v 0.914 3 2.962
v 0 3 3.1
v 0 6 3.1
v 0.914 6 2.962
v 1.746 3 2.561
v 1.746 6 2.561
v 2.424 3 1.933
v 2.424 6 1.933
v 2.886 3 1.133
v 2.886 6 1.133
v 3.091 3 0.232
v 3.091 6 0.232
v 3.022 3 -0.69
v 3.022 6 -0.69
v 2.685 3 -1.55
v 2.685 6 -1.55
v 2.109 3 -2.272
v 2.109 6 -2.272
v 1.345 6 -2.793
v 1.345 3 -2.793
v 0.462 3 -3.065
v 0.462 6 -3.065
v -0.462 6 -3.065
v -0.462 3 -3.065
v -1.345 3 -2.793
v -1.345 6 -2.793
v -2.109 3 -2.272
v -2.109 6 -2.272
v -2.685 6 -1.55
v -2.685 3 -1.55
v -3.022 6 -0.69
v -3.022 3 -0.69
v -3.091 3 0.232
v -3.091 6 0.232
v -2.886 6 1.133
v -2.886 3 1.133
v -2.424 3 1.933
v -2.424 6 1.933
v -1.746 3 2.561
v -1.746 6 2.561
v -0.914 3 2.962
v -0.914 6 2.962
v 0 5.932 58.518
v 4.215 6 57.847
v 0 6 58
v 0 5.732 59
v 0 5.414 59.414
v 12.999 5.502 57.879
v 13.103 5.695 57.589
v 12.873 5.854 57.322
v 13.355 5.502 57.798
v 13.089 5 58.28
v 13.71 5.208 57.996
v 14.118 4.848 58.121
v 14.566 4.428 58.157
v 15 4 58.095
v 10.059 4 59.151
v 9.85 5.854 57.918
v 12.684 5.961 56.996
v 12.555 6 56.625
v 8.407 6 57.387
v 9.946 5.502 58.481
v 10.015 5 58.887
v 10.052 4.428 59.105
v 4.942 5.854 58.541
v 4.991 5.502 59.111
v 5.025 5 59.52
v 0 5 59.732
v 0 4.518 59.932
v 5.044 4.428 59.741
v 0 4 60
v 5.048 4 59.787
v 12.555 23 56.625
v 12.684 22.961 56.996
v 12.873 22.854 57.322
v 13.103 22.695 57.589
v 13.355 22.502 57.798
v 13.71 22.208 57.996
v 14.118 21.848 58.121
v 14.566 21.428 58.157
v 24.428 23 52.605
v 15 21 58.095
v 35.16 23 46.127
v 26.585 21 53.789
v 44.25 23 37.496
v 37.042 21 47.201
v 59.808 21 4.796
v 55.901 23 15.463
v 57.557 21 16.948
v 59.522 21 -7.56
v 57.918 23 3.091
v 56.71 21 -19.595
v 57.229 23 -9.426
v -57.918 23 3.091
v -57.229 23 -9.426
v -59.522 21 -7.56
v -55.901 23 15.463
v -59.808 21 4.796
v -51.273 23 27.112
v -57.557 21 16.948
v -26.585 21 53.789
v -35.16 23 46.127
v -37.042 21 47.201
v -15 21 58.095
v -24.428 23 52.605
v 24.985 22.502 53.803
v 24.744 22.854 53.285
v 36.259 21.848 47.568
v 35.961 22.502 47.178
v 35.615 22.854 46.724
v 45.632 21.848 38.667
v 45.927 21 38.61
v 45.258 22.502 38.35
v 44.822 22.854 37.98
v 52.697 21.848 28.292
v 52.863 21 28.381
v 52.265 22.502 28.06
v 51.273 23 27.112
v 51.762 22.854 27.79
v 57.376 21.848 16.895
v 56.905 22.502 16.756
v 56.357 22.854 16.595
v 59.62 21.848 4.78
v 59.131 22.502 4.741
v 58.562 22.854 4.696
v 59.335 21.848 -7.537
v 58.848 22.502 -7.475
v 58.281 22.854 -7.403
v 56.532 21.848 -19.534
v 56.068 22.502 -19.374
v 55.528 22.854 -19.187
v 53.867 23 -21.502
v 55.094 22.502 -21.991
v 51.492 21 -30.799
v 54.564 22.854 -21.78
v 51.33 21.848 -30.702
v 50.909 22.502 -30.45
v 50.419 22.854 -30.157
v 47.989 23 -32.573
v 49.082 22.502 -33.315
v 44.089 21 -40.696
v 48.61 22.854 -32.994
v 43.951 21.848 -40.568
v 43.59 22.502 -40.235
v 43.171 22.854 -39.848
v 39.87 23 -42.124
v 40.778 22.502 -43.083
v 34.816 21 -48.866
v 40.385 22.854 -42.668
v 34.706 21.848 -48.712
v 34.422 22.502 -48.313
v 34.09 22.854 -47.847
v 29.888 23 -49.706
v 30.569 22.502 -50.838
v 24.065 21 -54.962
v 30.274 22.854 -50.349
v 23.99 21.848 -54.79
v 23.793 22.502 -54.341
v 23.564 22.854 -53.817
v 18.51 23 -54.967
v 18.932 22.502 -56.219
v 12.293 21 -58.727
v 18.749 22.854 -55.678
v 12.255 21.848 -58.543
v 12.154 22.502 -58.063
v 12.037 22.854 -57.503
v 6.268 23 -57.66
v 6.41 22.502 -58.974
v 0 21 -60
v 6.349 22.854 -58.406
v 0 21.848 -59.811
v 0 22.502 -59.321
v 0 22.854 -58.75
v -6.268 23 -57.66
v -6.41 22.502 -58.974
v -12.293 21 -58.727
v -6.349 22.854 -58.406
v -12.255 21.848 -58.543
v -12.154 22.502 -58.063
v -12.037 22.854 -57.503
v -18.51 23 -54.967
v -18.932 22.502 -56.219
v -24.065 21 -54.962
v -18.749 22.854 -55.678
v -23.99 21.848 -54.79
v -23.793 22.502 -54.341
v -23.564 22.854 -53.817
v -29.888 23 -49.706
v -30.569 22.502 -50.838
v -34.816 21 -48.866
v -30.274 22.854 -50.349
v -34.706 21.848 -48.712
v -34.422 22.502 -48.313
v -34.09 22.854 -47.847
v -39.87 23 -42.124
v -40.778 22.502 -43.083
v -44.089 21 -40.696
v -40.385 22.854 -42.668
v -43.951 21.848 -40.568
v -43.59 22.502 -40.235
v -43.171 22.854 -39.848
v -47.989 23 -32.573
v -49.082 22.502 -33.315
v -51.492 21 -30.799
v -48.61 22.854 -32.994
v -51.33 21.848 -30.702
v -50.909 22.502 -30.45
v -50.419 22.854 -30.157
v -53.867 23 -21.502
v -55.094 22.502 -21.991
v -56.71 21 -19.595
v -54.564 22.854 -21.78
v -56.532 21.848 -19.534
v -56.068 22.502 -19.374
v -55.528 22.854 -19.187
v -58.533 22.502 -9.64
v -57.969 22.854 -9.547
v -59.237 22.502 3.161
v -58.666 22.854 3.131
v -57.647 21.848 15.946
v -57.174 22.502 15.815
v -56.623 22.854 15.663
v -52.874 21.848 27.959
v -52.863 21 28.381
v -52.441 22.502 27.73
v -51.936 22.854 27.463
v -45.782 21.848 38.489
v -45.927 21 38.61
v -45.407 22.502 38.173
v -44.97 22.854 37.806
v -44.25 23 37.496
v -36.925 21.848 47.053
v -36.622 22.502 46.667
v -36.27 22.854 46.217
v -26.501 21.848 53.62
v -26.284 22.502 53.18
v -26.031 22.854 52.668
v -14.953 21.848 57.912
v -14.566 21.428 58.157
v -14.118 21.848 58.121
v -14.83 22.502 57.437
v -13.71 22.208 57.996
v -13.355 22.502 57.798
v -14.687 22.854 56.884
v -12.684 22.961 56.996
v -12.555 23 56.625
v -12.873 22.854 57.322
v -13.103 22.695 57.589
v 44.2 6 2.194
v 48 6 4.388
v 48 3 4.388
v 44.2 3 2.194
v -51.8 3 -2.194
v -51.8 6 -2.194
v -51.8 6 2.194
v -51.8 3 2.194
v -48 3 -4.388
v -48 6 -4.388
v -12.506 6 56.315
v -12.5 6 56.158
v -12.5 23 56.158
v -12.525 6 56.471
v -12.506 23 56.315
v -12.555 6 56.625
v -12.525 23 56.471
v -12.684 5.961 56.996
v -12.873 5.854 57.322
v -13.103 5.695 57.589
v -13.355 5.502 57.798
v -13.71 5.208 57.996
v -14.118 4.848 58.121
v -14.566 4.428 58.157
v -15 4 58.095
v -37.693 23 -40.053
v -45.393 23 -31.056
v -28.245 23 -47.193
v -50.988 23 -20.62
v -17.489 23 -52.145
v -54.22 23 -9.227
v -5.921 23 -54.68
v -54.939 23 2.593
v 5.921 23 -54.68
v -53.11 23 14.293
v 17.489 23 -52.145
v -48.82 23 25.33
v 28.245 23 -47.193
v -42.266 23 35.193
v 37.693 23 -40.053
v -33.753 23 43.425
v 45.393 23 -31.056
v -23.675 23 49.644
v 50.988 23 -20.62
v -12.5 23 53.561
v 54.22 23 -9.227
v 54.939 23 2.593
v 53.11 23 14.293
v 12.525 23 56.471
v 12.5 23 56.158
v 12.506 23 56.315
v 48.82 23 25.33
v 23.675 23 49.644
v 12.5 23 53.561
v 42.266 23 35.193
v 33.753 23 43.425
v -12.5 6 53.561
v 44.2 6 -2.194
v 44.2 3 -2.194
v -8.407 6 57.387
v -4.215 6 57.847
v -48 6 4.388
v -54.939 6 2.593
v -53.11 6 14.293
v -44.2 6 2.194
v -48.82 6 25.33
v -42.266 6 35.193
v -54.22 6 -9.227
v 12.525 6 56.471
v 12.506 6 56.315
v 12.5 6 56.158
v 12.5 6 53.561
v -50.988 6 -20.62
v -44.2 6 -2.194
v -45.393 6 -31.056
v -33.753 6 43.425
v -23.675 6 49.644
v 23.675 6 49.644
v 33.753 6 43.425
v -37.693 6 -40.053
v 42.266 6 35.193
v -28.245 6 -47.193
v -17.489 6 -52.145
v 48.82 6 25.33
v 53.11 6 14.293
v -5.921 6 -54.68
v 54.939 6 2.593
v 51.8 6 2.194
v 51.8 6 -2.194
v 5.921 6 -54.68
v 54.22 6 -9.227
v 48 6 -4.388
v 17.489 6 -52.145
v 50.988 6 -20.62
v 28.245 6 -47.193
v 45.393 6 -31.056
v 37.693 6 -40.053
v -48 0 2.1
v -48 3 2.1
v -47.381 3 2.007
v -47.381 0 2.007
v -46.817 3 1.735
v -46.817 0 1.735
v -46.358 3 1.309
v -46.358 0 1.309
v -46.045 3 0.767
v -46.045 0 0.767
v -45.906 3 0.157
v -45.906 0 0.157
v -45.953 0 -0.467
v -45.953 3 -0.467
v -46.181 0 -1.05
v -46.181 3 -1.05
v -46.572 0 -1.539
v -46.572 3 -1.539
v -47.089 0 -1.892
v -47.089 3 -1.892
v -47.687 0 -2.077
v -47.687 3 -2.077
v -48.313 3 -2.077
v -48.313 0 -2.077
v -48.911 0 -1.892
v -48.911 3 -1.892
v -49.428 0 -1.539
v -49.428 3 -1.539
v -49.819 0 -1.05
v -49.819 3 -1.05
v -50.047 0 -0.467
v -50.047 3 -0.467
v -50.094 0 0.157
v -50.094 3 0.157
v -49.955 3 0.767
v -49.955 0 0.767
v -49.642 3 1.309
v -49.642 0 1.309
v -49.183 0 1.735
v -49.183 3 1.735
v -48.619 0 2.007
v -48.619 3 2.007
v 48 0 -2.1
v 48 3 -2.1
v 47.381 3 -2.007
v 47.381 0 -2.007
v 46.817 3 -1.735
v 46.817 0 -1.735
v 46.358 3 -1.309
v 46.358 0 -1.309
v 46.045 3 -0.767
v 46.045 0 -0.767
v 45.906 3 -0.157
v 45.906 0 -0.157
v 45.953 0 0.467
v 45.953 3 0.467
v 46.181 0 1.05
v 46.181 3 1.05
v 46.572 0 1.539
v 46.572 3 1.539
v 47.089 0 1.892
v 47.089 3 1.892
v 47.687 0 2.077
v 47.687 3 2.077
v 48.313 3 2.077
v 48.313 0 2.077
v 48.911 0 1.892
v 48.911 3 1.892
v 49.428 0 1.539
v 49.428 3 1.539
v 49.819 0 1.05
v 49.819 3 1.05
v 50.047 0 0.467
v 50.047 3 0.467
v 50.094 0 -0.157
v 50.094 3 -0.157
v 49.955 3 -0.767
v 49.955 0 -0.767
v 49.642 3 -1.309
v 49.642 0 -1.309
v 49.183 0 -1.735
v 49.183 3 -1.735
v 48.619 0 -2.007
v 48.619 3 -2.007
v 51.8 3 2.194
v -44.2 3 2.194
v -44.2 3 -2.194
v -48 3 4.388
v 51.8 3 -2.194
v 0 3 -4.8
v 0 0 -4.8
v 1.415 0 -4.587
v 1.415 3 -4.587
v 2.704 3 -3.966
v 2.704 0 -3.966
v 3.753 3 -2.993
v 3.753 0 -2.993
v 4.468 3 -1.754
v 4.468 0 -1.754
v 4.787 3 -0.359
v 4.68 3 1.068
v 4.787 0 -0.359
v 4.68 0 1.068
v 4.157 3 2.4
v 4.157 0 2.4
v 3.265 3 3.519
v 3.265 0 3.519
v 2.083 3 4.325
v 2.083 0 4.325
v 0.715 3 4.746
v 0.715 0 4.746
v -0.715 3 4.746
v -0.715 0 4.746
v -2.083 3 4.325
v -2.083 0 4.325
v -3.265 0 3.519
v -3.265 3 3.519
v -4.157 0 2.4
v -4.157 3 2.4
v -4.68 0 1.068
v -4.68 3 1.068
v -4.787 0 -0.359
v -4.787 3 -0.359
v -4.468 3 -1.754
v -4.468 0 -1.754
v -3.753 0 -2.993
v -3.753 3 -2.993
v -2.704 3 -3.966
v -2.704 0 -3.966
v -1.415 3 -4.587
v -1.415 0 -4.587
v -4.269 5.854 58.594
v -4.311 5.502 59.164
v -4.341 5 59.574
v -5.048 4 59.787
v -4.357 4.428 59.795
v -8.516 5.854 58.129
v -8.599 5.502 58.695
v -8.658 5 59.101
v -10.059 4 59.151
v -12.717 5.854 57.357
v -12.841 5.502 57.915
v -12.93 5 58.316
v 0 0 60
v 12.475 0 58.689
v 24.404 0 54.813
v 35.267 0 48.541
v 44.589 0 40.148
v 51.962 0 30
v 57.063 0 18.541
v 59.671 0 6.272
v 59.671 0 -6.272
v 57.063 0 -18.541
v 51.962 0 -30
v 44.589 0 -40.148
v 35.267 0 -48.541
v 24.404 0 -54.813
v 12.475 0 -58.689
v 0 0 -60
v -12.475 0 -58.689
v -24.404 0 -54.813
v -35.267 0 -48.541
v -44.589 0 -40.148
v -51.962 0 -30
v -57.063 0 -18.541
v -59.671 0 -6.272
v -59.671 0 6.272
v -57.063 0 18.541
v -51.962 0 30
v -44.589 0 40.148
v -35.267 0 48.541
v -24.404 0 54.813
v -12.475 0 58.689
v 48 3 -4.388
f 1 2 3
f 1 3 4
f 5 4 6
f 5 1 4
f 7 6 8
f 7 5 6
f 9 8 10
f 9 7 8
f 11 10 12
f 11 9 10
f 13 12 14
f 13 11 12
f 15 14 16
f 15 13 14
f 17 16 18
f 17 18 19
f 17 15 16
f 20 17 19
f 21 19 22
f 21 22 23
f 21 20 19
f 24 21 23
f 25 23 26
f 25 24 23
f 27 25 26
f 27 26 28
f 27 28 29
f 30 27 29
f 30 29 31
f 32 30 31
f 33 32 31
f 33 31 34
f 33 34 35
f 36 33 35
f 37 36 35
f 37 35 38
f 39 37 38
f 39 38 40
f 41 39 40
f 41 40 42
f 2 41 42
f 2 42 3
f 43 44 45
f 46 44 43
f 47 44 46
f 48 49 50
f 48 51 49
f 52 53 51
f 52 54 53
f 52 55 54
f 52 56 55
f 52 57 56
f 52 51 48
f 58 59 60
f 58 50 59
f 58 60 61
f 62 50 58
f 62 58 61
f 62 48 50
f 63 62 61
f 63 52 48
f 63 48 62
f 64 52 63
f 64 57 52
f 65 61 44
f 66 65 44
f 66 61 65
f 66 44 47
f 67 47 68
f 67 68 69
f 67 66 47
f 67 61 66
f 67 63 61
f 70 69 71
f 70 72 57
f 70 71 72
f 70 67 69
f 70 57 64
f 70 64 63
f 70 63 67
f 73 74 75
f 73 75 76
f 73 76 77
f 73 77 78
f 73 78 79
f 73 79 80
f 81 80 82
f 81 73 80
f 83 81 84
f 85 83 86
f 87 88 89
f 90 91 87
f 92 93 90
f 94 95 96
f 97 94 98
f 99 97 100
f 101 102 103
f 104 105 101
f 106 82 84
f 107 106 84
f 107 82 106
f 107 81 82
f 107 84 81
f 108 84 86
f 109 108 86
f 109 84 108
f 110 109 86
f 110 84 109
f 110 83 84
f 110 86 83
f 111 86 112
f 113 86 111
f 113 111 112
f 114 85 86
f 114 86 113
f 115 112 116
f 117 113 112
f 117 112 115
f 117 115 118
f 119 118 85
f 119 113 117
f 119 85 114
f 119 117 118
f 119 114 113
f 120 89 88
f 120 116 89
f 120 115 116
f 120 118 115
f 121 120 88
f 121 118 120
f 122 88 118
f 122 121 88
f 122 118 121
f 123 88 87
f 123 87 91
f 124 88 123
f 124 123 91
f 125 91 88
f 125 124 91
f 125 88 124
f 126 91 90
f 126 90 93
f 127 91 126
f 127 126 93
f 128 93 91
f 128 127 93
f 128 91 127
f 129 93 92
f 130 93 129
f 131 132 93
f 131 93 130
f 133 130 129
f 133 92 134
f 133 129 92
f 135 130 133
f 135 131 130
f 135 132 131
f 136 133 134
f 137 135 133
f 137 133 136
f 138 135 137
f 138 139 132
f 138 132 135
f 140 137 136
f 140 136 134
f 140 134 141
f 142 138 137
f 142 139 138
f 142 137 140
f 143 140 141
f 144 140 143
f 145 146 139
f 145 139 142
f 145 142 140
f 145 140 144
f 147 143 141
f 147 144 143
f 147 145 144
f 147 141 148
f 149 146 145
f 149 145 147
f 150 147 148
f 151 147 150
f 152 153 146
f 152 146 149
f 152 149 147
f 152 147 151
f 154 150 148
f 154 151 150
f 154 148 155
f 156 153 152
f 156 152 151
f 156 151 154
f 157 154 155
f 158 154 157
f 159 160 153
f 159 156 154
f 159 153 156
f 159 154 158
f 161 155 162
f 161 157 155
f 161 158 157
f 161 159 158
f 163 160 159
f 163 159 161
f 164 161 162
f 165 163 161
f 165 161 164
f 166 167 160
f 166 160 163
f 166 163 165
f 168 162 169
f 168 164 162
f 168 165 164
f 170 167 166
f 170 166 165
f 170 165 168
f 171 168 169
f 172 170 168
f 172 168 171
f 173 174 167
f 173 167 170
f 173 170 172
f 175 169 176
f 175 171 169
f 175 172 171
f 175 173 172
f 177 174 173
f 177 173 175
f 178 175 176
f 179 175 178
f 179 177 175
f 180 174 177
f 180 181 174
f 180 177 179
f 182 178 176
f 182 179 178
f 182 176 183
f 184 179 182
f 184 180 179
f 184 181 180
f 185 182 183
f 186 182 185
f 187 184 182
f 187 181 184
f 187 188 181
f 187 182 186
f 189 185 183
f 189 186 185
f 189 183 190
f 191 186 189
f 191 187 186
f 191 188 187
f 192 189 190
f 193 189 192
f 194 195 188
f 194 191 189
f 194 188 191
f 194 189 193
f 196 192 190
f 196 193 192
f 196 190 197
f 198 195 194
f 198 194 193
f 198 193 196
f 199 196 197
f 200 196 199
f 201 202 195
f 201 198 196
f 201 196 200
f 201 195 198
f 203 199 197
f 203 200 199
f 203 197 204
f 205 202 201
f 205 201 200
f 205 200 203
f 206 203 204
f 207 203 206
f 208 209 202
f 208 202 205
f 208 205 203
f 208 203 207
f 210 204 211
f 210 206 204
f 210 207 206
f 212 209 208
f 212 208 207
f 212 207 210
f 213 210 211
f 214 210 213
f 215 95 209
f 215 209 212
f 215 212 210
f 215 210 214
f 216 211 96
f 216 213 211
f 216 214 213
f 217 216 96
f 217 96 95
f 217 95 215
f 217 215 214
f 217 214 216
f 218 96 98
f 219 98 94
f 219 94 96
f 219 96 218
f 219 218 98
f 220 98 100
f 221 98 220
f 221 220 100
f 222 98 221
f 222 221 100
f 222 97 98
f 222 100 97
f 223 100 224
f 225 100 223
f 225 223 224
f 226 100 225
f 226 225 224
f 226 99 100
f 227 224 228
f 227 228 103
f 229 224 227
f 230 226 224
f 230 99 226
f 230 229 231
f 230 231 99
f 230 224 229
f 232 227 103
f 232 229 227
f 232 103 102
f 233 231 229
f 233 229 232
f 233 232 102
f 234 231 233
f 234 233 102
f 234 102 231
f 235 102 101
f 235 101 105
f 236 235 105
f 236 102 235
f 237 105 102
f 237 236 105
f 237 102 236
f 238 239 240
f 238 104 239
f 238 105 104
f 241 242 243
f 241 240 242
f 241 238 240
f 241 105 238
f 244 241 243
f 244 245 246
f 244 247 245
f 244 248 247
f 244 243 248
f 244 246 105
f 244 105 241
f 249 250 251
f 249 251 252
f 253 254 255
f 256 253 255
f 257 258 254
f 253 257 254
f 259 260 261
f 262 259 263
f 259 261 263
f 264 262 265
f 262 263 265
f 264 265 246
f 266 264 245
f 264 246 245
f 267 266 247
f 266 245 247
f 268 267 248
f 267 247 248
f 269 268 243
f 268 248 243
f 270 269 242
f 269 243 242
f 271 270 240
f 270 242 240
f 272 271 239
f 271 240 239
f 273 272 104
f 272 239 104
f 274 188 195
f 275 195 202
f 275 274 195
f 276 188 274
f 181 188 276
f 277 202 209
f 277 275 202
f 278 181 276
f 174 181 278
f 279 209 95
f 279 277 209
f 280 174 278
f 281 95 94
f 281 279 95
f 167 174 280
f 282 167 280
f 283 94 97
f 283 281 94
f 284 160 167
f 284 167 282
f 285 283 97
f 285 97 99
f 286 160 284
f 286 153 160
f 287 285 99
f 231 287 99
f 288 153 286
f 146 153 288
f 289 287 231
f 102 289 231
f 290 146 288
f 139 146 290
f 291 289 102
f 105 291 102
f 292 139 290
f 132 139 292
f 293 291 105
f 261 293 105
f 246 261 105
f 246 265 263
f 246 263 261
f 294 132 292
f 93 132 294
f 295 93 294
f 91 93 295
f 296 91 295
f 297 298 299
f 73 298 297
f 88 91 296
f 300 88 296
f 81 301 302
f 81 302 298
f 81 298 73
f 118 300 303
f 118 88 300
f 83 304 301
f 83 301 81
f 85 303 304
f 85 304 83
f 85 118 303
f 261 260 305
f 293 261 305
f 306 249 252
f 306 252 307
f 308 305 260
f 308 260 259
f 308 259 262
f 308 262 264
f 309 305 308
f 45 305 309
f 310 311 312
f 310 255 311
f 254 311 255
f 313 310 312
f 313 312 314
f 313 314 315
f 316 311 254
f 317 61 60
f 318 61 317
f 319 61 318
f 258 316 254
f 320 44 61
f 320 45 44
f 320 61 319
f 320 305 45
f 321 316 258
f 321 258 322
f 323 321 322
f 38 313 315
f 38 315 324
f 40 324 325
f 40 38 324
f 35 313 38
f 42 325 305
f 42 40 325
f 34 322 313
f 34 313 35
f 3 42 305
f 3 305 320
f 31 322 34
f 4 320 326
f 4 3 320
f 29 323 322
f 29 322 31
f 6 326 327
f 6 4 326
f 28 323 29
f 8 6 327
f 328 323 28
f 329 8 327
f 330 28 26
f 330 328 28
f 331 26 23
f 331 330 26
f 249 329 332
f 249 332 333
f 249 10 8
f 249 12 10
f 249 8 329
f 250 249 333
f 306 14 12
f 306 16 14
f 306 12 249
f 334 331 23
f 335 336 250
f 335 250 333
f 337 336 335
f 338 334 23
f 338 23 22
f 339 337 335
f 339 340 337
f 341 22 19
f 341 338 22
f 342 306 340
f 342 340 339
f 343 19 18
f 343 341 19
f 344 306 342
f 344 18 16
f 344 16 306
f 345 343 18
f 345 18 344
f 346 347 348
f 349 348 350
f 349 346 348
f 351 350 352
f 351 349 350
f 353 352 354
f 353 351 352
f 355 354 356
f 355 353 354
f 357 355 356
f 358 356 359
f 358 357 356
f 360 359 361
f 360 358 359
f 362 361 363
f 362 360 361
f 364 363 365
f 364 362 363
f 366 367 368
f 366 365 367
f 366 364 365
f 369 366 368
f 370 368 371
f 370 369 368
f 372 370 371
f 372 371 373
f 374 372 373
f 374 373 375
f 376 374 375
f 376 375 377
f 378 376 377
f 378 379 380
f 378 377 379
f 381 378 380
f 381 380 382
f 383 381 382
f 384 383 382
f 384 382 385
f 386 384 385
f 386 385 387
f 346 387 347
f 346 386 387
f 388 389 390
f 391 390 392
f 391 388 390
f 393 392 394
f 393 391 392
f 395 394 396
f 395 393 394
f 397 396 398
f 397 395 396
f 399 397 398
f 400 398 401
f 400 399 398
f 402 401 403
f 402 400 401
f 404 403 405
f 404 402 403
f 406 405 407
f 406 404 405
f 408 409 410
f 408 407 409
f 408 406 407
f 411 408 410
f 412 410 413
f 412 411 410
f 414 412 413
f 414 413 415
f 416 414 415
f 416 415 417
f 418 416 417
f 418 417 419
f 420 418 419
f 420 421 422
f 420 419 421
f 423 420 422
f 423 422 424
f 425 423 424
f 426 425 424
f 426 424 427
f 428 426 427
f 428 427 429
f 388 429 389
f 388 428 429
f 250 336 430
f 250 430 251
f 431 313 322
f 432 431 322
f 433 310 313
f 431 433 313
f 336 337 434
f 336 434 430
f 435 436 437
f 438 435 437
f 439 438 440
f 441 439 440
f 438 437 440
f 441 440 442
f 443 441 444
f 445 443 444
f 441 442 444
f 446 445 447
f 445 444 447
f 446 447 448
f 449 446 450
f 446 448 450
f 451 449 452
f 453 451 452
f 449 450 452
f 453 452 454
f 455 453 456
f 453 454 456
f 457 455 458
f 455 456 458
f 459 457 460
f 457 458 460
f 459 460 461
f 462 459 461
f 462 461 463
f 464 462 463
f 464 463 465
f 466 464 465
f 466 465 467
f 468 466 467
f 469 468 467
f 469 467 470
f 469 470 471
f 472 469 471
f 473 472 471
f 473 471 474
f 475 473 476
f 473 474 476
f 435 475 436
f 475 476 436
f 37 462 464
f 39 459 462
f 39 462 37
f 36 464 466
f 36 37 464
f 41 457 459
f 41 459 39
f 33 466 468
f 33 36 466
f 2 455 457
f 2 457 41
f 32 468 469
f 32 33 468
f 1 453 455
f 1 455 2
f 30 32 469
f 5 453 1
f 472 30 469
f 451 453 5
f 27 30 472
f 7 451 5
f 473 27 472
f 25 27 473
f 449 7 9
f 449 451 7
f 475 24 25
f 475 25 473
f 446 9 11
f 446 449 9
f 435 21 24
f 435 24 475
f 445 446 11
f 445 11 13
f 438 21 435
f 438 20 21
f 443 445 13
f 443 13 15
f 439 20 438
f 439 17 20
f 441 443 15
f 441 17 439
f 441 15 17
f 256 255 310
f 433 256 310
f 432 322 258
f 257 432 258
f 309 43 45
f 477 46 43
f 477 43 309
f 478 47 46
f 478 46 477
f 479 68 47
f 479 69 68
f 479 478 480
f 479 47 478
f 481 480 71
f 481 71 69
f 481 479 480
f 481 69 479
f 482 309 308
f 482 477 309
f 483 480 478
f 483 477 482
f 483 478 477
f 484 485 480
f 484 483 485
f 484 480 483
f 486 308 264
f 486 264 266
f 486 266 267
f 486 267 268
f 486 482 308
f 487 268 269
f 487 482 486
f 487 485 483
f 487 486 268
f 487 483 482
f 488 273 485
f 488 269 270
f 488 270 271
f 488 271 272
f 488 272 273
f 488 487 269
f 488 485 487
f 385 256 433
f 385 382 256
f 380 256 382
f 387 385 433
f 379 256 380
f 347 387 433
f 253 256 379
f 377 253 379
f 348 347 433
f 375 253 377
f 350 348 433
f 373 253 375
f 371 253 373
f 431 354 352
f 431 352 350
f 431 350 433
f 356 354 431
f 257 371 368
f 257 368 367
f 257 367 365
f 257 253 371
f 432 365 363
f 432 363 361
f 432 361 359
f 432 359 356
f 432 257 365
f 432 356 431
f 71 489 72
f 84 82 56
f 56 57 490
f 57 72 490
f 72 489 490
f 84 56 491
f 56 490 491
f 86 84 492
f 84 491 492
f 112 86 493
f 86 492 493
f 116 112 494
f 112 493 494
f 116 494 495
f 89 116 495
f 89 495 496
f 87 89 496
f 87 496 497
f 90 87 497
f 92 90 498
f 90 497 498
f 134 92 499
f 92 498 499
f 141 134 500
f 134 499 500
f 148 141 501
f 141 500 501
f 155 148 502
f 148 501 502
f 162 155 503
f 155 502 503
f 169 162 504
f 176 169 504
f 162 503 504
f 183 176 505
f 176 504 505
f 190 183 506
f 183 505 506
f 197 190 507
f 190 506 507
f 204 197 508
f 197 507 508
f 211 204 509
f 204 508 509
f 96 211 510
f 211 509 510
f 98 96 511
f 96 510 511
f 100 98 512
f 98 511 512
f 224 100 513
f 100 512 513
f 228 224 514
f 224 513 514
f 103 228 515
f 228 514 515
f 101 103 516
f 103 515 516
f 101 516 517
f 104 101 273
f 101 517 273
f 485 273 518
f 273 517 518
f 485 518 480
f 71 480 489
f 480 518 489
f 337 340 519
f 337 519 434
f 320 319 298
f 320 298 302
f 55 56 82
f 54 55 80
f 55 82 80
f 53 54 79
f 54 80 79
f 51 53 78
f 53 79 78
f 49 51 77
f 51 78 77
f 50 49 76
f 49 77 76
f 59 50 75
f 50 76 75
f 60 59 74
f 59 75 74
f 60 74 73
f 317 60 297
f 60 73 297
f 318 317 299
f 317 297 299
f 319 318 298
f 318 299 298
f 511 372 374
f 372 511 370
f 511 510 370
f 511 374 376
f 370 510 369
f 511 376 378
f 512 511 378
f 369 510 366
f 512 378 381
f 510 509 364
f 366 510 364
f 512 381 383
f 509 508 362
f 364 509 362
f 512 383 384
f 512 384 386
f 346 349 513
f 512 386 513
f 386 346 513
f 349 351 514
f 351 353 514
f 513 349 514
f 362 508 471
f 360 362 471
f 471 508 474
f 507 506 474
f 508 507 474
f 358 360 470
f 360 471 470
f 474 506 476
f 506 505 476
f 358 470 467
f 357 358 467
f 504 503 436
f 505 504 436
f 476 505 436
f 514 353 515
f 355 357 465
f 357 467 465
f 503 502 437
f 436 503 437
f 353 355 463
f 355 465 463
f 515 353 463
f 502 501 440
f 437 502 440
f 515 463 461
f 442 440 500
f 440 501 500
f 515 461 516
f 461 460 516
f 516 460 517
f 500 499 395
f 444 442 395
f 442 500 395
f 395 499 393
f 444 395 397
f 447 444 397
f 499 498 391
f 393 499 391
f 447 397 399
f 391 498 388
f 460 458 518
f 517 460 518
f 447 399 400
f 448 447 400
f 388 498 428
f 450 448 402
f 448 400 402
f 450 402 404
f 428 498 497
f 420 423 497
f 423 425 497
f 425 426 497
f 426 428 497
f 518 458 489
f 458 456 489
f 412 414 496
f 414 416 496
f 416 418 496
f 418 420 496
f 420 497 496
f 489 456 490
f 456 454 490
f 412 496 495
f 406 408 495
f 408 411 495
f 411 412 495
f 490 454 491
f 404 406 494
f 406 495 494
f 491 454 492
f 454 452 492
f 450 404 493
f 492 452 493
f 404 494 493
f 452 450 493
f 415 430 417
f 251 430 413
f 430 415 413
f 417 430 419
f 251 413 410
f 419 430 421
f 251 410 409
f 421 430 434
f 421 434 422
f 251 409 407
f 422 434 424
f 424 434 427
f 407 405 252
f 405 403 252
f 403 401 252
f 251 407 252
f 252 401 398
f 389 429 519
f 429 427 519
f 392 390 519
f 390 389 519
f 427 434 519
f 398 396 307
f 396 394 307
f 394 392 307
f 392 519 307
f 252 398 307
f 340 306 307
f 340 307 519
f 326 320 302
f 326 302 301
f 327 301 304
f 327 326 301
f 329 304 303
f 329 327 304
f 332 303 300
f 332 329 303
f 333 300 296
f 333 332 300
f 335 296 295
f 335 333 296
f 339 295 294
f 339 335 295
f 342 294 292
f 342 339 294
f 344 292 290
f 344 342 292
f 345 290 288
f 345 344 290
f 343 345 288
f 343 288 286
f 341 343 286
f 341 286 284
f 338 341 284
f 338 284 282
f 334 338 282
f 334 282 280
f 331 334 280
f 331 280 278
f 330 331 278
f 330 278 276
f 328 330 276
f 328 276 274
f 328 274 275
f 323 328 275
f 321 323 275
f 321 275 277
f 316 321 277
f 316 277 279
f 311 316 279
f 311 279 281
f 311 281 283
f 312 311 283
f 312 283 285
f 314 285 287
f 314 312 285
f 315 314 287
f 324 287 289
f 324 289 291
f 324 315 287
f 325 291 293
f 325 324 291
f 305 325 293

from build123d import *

# Parameters (mm, degrees)
SKETCH1_R           = 60
SKETCH1_R_2         = 2.1
SKETCH1_R_3         = 3.1
BOSS_EXTRUDE1_DEPTH = 6
CUT_EXTRUDE1_DEPTH  = 3
SKETCH3_R           = 4.8
CUT_EXTRUDE2_DEPTH  = 3
SKETCH4_R           = 60
SKETCH4_R_2         = 55
BOSS_EXTRUDE2_DEPTH = 17
SKETCH5_W           = 25
SKETCH5_H           = 35
CUT_EXTRUDE3_DEPTH  = 87.539008545
FILLET1_R           = 2


with BuildPart() as part:
    # Sketch1 → Boss-Extrude1 (new body)
    with BuildSketch(Plane(origin=(0, 0, 0), x_dir=(1, 0, 0), z_dir=(0, 1, 0))):
        with Locations(Location((0, 0, 0), (0, 0, 270))):
            Circle(SKETCH1_R)
        with Locations(Location((-48, 0, 0), (0, 0, 270))):
            Circle(SKETCH1_R_2, mode=Mode.SUBTRACT)
        with Locations(Location((0, 0, 0), (0, 0, 270))):
            Circle(SKETCH1_R_3, mode=Mode.SUBTRACT)
        with Locations(Location((48, 0, 0), (0, 0, 90))):
            Circle(SKETCH1_R_2, mode=Mode.SUBTRACT)
    extrude(amount=BOSS_EXTRUDE1_DEPTH)

    # Sketch2 → Cut-Extrude1 (cut)
    with BuildSketch(Plane(origin=(0, 6, 0), x_dir=(1, 0, 0), z_dir=(0, 1, 0))):
        Polygon((-51.8, 2.193931023), (-51.8, -2.193931023), (-48, -4.387862046), (-44.2, -2.193931023), (-44.2, 2.193931023), (-48, 4.387862046), align=None)
        Polygon((48, 4.387862046), (51.8, 2.193931023), (51.8, -2.193931023), (48, -4.387862046), (44.2, -2.193931023), (44.2, 2.193931023), align=None)
    extrude(amount=-CUT_EXTRUDE1_DEPTH, mode=Mode.SUBTRACT)

    # Sketch3 → Cut-Extrude2 (cut)
    with BuildSketch(Plane.XZ):
        with Locations(Location((0, 0, 0), (0, 0, 270))):
            Circle(SKETCH3_R)
    extrude(amount=-CUT_EXTRUDE2_DEPTH, mode=Mode.SUBTRACT)

    # Sketch4 → Boss-Extrude2 (add)
    with BuildSketch(Plane(origin=(0, 6, 0), x_dir=(1, 0, 0), z_dir=(0, 1, 0))):
        with Locations(Location((0, 0, 0), (0, 0, 270))):
            Circle(SKETCH4_R)
        with Locations(Location((0, 0, 0), (0, 0, 270))):
            Circle(SKETCH4_R_2, mode=Mode.SUBTRACT)
    extrude(amount=BOSS_EXTRUDE2_DEPTH)

    # Sketch5 → Cut-Extrude3 (cut, through all)
    with BuildSketch(Plane(origin=(0, 6, 0), x_dir=(1, 0, 0), z_dir=(0, 1, 0))):
        with Locations((0, -50)):
            Rectangle(SKETCH5_W, SKETCH5_H)
    extrude(amount=CUT_EXTRUDE3_DEPTH, mode=Mode.SUBTRACT)

    # Fillet1
    # the kernel refuses this fillet: 2 mm, written as the material it takes off along each edge
    with BuildSketch(Plane(origin=(0, 23, 0), x_dir=(0.12573543795396686, 0, 0.9920638082515278), z_dir=(-0.9920638082515278, 0, 0.12573543795396686))) as fillet1_piece_1:
        with BuildLine():
            CenterArc((60 - FILLET1_R, -FILLET1_R), FILLET1_R, 0, 90)
            Line((60 - FILLET1_R, 0), (60, 0))
            Line((60, 0), (60, -FILLET1_R))
        make_face()
    revolve(axis=Axis((0, 23, 0), (0, 1, 0)), revolution_arc=345.553543265, mode=Mode.SUBTRACT)
    with BuildSketch(Plane(origin=(-12.5, 29.420959094, 58.683472972), x_dir=(-0.973374835212885, 0, -0.2292191749707888), z_dir=(0, -1, 0))) as fillet1_piece_2:
        with BuildLine():
            CenterArc((2.525577244, 1.999541851), FILLET1_R, 166.748894317, 104.477512186)
            Line((0.578827573, 2.457980201), (0, 0))
            ThreePointArc((0, 0), (1.284191819, -0.013744479), (2.568383638, 0))
        make_face()
    extrude(amount=23.420959094, mode=Mode.SUBTRACT)
    with BuildSketch(Plane(origin=(12.5, 29.420959094, 58.683472972), x_dir=(0.9733748352128844, 0, -0.22921917497079108), z_dir=(0, -1, 0))) as fillet1_piece_3:
        with BuildLine():
            CenterArc((2.525577244, -1.999541851), FILLET1_R, 88.773593497, 104.477512186)
            Line((0.578827573, -2.457980201), (0, 0))
            ThreePointArc((0, 0), (1.284191819, 0.013744479), (2.568383638, 0))
        make_face()
    extrude(amount=23.420959094, mode=Mode.SUBTRACT)
    with BuildSketch(Plane(origin=(0, 6, 0), x_dir=(0.2890214661785548, 0, 0.9573226165133667), z_dir=(0.9573226165133667, 0, -0.2890214661785548))) as fillet1_piece_4_section:
        with BuildLine():
            CenterArc((60 - FILLET1_R, FILLET1_R), FILLET1_R, 270, 90)
            Line((60 - FILLET1_R, 0), (60, 0))
            Line((60, 0), (60, FILLET1_R))
        make_face()
    fillet1_piece_4 = revolve(axis=Axis((0, 6, 0), (0, -1, 0)), revolution_arc=16.799381702, mode=Mode.PRIVATE)
    fillet1_piece_4 = split(fillet1_piece_4, bisect_by=Plane(origin=(12.5, 5.547238018, 59.104221097), z_dir=(-1, 0, 0)), keep=Keep.TOP, mode=Mode.PRIVATE)
    add(fillet1_piece_4, mode=Mode.SUBTRACT)
    with BuildSketch(Plane(origin=(0, 6, 0), x_dir=(0, 0, 1), z_dir=(1, 0, 0))) as fillet1_piece_5_section:
        with BuildLine():
            CenterArc((60 - FILLET1_R, FILLET1_R), FILLET1_R, 270, 90)
            Line((60 - FILLET1_R, 0), (60, 0))
            Line((60, 0), (60, FILLET1_R))
        make_face()
    fillet1_piece_5 = revolve(axis=Axis((0, 6, 0), (0, -1, 0)), revolution_arc=16.799381702, mode=Mode.PRIVATE)
    fillet1_piece_5 = split(fillet1_piece_5, bisect_by=Plane(origin=(-12.5, 5.5472381, 59.104220547), z_dir=(1, 0, 0)), keep=Keep.TOP, mode=Mode.PRIVATE)
    add(fillet1_piece_5, mode=Mode.SUBTRACT)
    with BuildSketch(Plane(origin=(0, 6, 0), x_dir=(0, 0, 1), z_dir=(1, 0, 0))) as fillet1_piece_6a_section:
        with BuildLine():
            CenterArc((60 - FILLET1_R, FILLET1_R), FILLET1_R, 270, 90)
            Line((60 - FILLET1_R, 0), (60, 0))
            Line((60, 0), (60, FILLET1_R))
        make_face()
    fillet1_piece_6a = revolve(axis=Axis((0, 6, 0), (0, -1, 0)), revolution_arc=16.799381702, mode=Mode.PRIVATE)
    fillet1_piece_6a = split(fillet1_piece_6a, bisect_by=Plane(origin=(-12.5, 5.540518873, 57.656474574), z_dir=(-1, 0, 0)), keep=Keep.TOP, mode=Mode.PRIVATE)
    with BuildSketch(Plane(origin=(-12.5, 29.420959094, 58.683472972), x_dir=(-0.973374835212885, 0, -0.2292191749707888), z_dir=(0, -1, 0))) as fillet1_piece_6b_section:
        with BuildLine():
            CenterArc((2.525577244, 1.999541851), FILLET1_R, 166.748894317, 104.477512186)
            Line((0.578827573, 2.457980201), (0, 0))
            ThreePointArc((0, 0), (1.284191819, -0.013744479), (2.568383638, 0))
        make_face()
    fillet1_piece_6b = extrude(amount=29.841918188, mode=Mode.PRIVATE)
    fillet1_piece_6b = split(fillet1_piece_6b, bisect_by=Plane(origin=(-13.085266846, 6, 57.965433437), z_dir=(0, -1, 0)), keep=Keep.TOP, mode=Mode.PRIVATE)
    fillet1_piece_6 = fillet1_piece_6a & fillet1_piece_6b
    add(fillet1_piece_6, mode=Mode.SUBTRACT)
    with BuildSketch(Plane(origin=(12.5, 29.420959094, 58.683472972), x_dir=(0.9733748352128844, 0, -0.22921917497079108), z_dir=(0, -1, 0))) as fillet1_piece_7a_section:
        with BuildLine():
            CenterArc((2.525577244, -1.999541851), FILLET1_R, 88.773593497, 104.477512186)
            Line((0.578827573, -2.457980201), (0, 0))
            ThreePointArc((0, 0), (1.284191819, 0.013744479), (2.568383638, 0))
        make_face()
    fillet1_piece_7a = extrude(amount=29.841918188, mode=Mode.PRIVATE)
    fillet1_piece_7a = split(fillet1_piece_7a, bisect_by=Plane(origin=(13.085266846, 6, 57.965433437), z_dir=(0, -1, 0)), keep=Keep.TOP, mode=Mode.PRIVATE)
    with BuildSketch(Plane(origin=(0, 6, 0), x_dir=(0.2890214661785548, 0, 0.9573226165133667), z_dir=(0.9573226165133667, 0, -0.2890214661785548))) as fillet1_piece_7b_section:
        with BuildLine():
            CenterArc((60 - FILLET1_R, FILLET1_R), FILLET1_R, 270, 90)
            Line((60 - FILLET1_R, 0), (60, 0))
            Line((60, 0), (60, FILLET1_R))
        make_face()
    fillet1_piece_7b = revolve(axis=Axis((0, 6, 0), (0, -1, 0)), revolution_arc=16.799381702, mode=Mode.PRIVATE)
    fillet1_piece_7b = split(fillet1_piece_7b, bisect_by=Plane(origin=(12.5, 5.540518947, 57.656474329), z_dir=(1, 0, 0)), keep=Keep.TOP, mode=Mode.PRIVATE)
    fillet1_piece_7 = fillet1_piece_7a & fillet1_piece_7b
    add(fillet1_piece_7, mode=Mode.SUBTRACT)


solid = part.part
